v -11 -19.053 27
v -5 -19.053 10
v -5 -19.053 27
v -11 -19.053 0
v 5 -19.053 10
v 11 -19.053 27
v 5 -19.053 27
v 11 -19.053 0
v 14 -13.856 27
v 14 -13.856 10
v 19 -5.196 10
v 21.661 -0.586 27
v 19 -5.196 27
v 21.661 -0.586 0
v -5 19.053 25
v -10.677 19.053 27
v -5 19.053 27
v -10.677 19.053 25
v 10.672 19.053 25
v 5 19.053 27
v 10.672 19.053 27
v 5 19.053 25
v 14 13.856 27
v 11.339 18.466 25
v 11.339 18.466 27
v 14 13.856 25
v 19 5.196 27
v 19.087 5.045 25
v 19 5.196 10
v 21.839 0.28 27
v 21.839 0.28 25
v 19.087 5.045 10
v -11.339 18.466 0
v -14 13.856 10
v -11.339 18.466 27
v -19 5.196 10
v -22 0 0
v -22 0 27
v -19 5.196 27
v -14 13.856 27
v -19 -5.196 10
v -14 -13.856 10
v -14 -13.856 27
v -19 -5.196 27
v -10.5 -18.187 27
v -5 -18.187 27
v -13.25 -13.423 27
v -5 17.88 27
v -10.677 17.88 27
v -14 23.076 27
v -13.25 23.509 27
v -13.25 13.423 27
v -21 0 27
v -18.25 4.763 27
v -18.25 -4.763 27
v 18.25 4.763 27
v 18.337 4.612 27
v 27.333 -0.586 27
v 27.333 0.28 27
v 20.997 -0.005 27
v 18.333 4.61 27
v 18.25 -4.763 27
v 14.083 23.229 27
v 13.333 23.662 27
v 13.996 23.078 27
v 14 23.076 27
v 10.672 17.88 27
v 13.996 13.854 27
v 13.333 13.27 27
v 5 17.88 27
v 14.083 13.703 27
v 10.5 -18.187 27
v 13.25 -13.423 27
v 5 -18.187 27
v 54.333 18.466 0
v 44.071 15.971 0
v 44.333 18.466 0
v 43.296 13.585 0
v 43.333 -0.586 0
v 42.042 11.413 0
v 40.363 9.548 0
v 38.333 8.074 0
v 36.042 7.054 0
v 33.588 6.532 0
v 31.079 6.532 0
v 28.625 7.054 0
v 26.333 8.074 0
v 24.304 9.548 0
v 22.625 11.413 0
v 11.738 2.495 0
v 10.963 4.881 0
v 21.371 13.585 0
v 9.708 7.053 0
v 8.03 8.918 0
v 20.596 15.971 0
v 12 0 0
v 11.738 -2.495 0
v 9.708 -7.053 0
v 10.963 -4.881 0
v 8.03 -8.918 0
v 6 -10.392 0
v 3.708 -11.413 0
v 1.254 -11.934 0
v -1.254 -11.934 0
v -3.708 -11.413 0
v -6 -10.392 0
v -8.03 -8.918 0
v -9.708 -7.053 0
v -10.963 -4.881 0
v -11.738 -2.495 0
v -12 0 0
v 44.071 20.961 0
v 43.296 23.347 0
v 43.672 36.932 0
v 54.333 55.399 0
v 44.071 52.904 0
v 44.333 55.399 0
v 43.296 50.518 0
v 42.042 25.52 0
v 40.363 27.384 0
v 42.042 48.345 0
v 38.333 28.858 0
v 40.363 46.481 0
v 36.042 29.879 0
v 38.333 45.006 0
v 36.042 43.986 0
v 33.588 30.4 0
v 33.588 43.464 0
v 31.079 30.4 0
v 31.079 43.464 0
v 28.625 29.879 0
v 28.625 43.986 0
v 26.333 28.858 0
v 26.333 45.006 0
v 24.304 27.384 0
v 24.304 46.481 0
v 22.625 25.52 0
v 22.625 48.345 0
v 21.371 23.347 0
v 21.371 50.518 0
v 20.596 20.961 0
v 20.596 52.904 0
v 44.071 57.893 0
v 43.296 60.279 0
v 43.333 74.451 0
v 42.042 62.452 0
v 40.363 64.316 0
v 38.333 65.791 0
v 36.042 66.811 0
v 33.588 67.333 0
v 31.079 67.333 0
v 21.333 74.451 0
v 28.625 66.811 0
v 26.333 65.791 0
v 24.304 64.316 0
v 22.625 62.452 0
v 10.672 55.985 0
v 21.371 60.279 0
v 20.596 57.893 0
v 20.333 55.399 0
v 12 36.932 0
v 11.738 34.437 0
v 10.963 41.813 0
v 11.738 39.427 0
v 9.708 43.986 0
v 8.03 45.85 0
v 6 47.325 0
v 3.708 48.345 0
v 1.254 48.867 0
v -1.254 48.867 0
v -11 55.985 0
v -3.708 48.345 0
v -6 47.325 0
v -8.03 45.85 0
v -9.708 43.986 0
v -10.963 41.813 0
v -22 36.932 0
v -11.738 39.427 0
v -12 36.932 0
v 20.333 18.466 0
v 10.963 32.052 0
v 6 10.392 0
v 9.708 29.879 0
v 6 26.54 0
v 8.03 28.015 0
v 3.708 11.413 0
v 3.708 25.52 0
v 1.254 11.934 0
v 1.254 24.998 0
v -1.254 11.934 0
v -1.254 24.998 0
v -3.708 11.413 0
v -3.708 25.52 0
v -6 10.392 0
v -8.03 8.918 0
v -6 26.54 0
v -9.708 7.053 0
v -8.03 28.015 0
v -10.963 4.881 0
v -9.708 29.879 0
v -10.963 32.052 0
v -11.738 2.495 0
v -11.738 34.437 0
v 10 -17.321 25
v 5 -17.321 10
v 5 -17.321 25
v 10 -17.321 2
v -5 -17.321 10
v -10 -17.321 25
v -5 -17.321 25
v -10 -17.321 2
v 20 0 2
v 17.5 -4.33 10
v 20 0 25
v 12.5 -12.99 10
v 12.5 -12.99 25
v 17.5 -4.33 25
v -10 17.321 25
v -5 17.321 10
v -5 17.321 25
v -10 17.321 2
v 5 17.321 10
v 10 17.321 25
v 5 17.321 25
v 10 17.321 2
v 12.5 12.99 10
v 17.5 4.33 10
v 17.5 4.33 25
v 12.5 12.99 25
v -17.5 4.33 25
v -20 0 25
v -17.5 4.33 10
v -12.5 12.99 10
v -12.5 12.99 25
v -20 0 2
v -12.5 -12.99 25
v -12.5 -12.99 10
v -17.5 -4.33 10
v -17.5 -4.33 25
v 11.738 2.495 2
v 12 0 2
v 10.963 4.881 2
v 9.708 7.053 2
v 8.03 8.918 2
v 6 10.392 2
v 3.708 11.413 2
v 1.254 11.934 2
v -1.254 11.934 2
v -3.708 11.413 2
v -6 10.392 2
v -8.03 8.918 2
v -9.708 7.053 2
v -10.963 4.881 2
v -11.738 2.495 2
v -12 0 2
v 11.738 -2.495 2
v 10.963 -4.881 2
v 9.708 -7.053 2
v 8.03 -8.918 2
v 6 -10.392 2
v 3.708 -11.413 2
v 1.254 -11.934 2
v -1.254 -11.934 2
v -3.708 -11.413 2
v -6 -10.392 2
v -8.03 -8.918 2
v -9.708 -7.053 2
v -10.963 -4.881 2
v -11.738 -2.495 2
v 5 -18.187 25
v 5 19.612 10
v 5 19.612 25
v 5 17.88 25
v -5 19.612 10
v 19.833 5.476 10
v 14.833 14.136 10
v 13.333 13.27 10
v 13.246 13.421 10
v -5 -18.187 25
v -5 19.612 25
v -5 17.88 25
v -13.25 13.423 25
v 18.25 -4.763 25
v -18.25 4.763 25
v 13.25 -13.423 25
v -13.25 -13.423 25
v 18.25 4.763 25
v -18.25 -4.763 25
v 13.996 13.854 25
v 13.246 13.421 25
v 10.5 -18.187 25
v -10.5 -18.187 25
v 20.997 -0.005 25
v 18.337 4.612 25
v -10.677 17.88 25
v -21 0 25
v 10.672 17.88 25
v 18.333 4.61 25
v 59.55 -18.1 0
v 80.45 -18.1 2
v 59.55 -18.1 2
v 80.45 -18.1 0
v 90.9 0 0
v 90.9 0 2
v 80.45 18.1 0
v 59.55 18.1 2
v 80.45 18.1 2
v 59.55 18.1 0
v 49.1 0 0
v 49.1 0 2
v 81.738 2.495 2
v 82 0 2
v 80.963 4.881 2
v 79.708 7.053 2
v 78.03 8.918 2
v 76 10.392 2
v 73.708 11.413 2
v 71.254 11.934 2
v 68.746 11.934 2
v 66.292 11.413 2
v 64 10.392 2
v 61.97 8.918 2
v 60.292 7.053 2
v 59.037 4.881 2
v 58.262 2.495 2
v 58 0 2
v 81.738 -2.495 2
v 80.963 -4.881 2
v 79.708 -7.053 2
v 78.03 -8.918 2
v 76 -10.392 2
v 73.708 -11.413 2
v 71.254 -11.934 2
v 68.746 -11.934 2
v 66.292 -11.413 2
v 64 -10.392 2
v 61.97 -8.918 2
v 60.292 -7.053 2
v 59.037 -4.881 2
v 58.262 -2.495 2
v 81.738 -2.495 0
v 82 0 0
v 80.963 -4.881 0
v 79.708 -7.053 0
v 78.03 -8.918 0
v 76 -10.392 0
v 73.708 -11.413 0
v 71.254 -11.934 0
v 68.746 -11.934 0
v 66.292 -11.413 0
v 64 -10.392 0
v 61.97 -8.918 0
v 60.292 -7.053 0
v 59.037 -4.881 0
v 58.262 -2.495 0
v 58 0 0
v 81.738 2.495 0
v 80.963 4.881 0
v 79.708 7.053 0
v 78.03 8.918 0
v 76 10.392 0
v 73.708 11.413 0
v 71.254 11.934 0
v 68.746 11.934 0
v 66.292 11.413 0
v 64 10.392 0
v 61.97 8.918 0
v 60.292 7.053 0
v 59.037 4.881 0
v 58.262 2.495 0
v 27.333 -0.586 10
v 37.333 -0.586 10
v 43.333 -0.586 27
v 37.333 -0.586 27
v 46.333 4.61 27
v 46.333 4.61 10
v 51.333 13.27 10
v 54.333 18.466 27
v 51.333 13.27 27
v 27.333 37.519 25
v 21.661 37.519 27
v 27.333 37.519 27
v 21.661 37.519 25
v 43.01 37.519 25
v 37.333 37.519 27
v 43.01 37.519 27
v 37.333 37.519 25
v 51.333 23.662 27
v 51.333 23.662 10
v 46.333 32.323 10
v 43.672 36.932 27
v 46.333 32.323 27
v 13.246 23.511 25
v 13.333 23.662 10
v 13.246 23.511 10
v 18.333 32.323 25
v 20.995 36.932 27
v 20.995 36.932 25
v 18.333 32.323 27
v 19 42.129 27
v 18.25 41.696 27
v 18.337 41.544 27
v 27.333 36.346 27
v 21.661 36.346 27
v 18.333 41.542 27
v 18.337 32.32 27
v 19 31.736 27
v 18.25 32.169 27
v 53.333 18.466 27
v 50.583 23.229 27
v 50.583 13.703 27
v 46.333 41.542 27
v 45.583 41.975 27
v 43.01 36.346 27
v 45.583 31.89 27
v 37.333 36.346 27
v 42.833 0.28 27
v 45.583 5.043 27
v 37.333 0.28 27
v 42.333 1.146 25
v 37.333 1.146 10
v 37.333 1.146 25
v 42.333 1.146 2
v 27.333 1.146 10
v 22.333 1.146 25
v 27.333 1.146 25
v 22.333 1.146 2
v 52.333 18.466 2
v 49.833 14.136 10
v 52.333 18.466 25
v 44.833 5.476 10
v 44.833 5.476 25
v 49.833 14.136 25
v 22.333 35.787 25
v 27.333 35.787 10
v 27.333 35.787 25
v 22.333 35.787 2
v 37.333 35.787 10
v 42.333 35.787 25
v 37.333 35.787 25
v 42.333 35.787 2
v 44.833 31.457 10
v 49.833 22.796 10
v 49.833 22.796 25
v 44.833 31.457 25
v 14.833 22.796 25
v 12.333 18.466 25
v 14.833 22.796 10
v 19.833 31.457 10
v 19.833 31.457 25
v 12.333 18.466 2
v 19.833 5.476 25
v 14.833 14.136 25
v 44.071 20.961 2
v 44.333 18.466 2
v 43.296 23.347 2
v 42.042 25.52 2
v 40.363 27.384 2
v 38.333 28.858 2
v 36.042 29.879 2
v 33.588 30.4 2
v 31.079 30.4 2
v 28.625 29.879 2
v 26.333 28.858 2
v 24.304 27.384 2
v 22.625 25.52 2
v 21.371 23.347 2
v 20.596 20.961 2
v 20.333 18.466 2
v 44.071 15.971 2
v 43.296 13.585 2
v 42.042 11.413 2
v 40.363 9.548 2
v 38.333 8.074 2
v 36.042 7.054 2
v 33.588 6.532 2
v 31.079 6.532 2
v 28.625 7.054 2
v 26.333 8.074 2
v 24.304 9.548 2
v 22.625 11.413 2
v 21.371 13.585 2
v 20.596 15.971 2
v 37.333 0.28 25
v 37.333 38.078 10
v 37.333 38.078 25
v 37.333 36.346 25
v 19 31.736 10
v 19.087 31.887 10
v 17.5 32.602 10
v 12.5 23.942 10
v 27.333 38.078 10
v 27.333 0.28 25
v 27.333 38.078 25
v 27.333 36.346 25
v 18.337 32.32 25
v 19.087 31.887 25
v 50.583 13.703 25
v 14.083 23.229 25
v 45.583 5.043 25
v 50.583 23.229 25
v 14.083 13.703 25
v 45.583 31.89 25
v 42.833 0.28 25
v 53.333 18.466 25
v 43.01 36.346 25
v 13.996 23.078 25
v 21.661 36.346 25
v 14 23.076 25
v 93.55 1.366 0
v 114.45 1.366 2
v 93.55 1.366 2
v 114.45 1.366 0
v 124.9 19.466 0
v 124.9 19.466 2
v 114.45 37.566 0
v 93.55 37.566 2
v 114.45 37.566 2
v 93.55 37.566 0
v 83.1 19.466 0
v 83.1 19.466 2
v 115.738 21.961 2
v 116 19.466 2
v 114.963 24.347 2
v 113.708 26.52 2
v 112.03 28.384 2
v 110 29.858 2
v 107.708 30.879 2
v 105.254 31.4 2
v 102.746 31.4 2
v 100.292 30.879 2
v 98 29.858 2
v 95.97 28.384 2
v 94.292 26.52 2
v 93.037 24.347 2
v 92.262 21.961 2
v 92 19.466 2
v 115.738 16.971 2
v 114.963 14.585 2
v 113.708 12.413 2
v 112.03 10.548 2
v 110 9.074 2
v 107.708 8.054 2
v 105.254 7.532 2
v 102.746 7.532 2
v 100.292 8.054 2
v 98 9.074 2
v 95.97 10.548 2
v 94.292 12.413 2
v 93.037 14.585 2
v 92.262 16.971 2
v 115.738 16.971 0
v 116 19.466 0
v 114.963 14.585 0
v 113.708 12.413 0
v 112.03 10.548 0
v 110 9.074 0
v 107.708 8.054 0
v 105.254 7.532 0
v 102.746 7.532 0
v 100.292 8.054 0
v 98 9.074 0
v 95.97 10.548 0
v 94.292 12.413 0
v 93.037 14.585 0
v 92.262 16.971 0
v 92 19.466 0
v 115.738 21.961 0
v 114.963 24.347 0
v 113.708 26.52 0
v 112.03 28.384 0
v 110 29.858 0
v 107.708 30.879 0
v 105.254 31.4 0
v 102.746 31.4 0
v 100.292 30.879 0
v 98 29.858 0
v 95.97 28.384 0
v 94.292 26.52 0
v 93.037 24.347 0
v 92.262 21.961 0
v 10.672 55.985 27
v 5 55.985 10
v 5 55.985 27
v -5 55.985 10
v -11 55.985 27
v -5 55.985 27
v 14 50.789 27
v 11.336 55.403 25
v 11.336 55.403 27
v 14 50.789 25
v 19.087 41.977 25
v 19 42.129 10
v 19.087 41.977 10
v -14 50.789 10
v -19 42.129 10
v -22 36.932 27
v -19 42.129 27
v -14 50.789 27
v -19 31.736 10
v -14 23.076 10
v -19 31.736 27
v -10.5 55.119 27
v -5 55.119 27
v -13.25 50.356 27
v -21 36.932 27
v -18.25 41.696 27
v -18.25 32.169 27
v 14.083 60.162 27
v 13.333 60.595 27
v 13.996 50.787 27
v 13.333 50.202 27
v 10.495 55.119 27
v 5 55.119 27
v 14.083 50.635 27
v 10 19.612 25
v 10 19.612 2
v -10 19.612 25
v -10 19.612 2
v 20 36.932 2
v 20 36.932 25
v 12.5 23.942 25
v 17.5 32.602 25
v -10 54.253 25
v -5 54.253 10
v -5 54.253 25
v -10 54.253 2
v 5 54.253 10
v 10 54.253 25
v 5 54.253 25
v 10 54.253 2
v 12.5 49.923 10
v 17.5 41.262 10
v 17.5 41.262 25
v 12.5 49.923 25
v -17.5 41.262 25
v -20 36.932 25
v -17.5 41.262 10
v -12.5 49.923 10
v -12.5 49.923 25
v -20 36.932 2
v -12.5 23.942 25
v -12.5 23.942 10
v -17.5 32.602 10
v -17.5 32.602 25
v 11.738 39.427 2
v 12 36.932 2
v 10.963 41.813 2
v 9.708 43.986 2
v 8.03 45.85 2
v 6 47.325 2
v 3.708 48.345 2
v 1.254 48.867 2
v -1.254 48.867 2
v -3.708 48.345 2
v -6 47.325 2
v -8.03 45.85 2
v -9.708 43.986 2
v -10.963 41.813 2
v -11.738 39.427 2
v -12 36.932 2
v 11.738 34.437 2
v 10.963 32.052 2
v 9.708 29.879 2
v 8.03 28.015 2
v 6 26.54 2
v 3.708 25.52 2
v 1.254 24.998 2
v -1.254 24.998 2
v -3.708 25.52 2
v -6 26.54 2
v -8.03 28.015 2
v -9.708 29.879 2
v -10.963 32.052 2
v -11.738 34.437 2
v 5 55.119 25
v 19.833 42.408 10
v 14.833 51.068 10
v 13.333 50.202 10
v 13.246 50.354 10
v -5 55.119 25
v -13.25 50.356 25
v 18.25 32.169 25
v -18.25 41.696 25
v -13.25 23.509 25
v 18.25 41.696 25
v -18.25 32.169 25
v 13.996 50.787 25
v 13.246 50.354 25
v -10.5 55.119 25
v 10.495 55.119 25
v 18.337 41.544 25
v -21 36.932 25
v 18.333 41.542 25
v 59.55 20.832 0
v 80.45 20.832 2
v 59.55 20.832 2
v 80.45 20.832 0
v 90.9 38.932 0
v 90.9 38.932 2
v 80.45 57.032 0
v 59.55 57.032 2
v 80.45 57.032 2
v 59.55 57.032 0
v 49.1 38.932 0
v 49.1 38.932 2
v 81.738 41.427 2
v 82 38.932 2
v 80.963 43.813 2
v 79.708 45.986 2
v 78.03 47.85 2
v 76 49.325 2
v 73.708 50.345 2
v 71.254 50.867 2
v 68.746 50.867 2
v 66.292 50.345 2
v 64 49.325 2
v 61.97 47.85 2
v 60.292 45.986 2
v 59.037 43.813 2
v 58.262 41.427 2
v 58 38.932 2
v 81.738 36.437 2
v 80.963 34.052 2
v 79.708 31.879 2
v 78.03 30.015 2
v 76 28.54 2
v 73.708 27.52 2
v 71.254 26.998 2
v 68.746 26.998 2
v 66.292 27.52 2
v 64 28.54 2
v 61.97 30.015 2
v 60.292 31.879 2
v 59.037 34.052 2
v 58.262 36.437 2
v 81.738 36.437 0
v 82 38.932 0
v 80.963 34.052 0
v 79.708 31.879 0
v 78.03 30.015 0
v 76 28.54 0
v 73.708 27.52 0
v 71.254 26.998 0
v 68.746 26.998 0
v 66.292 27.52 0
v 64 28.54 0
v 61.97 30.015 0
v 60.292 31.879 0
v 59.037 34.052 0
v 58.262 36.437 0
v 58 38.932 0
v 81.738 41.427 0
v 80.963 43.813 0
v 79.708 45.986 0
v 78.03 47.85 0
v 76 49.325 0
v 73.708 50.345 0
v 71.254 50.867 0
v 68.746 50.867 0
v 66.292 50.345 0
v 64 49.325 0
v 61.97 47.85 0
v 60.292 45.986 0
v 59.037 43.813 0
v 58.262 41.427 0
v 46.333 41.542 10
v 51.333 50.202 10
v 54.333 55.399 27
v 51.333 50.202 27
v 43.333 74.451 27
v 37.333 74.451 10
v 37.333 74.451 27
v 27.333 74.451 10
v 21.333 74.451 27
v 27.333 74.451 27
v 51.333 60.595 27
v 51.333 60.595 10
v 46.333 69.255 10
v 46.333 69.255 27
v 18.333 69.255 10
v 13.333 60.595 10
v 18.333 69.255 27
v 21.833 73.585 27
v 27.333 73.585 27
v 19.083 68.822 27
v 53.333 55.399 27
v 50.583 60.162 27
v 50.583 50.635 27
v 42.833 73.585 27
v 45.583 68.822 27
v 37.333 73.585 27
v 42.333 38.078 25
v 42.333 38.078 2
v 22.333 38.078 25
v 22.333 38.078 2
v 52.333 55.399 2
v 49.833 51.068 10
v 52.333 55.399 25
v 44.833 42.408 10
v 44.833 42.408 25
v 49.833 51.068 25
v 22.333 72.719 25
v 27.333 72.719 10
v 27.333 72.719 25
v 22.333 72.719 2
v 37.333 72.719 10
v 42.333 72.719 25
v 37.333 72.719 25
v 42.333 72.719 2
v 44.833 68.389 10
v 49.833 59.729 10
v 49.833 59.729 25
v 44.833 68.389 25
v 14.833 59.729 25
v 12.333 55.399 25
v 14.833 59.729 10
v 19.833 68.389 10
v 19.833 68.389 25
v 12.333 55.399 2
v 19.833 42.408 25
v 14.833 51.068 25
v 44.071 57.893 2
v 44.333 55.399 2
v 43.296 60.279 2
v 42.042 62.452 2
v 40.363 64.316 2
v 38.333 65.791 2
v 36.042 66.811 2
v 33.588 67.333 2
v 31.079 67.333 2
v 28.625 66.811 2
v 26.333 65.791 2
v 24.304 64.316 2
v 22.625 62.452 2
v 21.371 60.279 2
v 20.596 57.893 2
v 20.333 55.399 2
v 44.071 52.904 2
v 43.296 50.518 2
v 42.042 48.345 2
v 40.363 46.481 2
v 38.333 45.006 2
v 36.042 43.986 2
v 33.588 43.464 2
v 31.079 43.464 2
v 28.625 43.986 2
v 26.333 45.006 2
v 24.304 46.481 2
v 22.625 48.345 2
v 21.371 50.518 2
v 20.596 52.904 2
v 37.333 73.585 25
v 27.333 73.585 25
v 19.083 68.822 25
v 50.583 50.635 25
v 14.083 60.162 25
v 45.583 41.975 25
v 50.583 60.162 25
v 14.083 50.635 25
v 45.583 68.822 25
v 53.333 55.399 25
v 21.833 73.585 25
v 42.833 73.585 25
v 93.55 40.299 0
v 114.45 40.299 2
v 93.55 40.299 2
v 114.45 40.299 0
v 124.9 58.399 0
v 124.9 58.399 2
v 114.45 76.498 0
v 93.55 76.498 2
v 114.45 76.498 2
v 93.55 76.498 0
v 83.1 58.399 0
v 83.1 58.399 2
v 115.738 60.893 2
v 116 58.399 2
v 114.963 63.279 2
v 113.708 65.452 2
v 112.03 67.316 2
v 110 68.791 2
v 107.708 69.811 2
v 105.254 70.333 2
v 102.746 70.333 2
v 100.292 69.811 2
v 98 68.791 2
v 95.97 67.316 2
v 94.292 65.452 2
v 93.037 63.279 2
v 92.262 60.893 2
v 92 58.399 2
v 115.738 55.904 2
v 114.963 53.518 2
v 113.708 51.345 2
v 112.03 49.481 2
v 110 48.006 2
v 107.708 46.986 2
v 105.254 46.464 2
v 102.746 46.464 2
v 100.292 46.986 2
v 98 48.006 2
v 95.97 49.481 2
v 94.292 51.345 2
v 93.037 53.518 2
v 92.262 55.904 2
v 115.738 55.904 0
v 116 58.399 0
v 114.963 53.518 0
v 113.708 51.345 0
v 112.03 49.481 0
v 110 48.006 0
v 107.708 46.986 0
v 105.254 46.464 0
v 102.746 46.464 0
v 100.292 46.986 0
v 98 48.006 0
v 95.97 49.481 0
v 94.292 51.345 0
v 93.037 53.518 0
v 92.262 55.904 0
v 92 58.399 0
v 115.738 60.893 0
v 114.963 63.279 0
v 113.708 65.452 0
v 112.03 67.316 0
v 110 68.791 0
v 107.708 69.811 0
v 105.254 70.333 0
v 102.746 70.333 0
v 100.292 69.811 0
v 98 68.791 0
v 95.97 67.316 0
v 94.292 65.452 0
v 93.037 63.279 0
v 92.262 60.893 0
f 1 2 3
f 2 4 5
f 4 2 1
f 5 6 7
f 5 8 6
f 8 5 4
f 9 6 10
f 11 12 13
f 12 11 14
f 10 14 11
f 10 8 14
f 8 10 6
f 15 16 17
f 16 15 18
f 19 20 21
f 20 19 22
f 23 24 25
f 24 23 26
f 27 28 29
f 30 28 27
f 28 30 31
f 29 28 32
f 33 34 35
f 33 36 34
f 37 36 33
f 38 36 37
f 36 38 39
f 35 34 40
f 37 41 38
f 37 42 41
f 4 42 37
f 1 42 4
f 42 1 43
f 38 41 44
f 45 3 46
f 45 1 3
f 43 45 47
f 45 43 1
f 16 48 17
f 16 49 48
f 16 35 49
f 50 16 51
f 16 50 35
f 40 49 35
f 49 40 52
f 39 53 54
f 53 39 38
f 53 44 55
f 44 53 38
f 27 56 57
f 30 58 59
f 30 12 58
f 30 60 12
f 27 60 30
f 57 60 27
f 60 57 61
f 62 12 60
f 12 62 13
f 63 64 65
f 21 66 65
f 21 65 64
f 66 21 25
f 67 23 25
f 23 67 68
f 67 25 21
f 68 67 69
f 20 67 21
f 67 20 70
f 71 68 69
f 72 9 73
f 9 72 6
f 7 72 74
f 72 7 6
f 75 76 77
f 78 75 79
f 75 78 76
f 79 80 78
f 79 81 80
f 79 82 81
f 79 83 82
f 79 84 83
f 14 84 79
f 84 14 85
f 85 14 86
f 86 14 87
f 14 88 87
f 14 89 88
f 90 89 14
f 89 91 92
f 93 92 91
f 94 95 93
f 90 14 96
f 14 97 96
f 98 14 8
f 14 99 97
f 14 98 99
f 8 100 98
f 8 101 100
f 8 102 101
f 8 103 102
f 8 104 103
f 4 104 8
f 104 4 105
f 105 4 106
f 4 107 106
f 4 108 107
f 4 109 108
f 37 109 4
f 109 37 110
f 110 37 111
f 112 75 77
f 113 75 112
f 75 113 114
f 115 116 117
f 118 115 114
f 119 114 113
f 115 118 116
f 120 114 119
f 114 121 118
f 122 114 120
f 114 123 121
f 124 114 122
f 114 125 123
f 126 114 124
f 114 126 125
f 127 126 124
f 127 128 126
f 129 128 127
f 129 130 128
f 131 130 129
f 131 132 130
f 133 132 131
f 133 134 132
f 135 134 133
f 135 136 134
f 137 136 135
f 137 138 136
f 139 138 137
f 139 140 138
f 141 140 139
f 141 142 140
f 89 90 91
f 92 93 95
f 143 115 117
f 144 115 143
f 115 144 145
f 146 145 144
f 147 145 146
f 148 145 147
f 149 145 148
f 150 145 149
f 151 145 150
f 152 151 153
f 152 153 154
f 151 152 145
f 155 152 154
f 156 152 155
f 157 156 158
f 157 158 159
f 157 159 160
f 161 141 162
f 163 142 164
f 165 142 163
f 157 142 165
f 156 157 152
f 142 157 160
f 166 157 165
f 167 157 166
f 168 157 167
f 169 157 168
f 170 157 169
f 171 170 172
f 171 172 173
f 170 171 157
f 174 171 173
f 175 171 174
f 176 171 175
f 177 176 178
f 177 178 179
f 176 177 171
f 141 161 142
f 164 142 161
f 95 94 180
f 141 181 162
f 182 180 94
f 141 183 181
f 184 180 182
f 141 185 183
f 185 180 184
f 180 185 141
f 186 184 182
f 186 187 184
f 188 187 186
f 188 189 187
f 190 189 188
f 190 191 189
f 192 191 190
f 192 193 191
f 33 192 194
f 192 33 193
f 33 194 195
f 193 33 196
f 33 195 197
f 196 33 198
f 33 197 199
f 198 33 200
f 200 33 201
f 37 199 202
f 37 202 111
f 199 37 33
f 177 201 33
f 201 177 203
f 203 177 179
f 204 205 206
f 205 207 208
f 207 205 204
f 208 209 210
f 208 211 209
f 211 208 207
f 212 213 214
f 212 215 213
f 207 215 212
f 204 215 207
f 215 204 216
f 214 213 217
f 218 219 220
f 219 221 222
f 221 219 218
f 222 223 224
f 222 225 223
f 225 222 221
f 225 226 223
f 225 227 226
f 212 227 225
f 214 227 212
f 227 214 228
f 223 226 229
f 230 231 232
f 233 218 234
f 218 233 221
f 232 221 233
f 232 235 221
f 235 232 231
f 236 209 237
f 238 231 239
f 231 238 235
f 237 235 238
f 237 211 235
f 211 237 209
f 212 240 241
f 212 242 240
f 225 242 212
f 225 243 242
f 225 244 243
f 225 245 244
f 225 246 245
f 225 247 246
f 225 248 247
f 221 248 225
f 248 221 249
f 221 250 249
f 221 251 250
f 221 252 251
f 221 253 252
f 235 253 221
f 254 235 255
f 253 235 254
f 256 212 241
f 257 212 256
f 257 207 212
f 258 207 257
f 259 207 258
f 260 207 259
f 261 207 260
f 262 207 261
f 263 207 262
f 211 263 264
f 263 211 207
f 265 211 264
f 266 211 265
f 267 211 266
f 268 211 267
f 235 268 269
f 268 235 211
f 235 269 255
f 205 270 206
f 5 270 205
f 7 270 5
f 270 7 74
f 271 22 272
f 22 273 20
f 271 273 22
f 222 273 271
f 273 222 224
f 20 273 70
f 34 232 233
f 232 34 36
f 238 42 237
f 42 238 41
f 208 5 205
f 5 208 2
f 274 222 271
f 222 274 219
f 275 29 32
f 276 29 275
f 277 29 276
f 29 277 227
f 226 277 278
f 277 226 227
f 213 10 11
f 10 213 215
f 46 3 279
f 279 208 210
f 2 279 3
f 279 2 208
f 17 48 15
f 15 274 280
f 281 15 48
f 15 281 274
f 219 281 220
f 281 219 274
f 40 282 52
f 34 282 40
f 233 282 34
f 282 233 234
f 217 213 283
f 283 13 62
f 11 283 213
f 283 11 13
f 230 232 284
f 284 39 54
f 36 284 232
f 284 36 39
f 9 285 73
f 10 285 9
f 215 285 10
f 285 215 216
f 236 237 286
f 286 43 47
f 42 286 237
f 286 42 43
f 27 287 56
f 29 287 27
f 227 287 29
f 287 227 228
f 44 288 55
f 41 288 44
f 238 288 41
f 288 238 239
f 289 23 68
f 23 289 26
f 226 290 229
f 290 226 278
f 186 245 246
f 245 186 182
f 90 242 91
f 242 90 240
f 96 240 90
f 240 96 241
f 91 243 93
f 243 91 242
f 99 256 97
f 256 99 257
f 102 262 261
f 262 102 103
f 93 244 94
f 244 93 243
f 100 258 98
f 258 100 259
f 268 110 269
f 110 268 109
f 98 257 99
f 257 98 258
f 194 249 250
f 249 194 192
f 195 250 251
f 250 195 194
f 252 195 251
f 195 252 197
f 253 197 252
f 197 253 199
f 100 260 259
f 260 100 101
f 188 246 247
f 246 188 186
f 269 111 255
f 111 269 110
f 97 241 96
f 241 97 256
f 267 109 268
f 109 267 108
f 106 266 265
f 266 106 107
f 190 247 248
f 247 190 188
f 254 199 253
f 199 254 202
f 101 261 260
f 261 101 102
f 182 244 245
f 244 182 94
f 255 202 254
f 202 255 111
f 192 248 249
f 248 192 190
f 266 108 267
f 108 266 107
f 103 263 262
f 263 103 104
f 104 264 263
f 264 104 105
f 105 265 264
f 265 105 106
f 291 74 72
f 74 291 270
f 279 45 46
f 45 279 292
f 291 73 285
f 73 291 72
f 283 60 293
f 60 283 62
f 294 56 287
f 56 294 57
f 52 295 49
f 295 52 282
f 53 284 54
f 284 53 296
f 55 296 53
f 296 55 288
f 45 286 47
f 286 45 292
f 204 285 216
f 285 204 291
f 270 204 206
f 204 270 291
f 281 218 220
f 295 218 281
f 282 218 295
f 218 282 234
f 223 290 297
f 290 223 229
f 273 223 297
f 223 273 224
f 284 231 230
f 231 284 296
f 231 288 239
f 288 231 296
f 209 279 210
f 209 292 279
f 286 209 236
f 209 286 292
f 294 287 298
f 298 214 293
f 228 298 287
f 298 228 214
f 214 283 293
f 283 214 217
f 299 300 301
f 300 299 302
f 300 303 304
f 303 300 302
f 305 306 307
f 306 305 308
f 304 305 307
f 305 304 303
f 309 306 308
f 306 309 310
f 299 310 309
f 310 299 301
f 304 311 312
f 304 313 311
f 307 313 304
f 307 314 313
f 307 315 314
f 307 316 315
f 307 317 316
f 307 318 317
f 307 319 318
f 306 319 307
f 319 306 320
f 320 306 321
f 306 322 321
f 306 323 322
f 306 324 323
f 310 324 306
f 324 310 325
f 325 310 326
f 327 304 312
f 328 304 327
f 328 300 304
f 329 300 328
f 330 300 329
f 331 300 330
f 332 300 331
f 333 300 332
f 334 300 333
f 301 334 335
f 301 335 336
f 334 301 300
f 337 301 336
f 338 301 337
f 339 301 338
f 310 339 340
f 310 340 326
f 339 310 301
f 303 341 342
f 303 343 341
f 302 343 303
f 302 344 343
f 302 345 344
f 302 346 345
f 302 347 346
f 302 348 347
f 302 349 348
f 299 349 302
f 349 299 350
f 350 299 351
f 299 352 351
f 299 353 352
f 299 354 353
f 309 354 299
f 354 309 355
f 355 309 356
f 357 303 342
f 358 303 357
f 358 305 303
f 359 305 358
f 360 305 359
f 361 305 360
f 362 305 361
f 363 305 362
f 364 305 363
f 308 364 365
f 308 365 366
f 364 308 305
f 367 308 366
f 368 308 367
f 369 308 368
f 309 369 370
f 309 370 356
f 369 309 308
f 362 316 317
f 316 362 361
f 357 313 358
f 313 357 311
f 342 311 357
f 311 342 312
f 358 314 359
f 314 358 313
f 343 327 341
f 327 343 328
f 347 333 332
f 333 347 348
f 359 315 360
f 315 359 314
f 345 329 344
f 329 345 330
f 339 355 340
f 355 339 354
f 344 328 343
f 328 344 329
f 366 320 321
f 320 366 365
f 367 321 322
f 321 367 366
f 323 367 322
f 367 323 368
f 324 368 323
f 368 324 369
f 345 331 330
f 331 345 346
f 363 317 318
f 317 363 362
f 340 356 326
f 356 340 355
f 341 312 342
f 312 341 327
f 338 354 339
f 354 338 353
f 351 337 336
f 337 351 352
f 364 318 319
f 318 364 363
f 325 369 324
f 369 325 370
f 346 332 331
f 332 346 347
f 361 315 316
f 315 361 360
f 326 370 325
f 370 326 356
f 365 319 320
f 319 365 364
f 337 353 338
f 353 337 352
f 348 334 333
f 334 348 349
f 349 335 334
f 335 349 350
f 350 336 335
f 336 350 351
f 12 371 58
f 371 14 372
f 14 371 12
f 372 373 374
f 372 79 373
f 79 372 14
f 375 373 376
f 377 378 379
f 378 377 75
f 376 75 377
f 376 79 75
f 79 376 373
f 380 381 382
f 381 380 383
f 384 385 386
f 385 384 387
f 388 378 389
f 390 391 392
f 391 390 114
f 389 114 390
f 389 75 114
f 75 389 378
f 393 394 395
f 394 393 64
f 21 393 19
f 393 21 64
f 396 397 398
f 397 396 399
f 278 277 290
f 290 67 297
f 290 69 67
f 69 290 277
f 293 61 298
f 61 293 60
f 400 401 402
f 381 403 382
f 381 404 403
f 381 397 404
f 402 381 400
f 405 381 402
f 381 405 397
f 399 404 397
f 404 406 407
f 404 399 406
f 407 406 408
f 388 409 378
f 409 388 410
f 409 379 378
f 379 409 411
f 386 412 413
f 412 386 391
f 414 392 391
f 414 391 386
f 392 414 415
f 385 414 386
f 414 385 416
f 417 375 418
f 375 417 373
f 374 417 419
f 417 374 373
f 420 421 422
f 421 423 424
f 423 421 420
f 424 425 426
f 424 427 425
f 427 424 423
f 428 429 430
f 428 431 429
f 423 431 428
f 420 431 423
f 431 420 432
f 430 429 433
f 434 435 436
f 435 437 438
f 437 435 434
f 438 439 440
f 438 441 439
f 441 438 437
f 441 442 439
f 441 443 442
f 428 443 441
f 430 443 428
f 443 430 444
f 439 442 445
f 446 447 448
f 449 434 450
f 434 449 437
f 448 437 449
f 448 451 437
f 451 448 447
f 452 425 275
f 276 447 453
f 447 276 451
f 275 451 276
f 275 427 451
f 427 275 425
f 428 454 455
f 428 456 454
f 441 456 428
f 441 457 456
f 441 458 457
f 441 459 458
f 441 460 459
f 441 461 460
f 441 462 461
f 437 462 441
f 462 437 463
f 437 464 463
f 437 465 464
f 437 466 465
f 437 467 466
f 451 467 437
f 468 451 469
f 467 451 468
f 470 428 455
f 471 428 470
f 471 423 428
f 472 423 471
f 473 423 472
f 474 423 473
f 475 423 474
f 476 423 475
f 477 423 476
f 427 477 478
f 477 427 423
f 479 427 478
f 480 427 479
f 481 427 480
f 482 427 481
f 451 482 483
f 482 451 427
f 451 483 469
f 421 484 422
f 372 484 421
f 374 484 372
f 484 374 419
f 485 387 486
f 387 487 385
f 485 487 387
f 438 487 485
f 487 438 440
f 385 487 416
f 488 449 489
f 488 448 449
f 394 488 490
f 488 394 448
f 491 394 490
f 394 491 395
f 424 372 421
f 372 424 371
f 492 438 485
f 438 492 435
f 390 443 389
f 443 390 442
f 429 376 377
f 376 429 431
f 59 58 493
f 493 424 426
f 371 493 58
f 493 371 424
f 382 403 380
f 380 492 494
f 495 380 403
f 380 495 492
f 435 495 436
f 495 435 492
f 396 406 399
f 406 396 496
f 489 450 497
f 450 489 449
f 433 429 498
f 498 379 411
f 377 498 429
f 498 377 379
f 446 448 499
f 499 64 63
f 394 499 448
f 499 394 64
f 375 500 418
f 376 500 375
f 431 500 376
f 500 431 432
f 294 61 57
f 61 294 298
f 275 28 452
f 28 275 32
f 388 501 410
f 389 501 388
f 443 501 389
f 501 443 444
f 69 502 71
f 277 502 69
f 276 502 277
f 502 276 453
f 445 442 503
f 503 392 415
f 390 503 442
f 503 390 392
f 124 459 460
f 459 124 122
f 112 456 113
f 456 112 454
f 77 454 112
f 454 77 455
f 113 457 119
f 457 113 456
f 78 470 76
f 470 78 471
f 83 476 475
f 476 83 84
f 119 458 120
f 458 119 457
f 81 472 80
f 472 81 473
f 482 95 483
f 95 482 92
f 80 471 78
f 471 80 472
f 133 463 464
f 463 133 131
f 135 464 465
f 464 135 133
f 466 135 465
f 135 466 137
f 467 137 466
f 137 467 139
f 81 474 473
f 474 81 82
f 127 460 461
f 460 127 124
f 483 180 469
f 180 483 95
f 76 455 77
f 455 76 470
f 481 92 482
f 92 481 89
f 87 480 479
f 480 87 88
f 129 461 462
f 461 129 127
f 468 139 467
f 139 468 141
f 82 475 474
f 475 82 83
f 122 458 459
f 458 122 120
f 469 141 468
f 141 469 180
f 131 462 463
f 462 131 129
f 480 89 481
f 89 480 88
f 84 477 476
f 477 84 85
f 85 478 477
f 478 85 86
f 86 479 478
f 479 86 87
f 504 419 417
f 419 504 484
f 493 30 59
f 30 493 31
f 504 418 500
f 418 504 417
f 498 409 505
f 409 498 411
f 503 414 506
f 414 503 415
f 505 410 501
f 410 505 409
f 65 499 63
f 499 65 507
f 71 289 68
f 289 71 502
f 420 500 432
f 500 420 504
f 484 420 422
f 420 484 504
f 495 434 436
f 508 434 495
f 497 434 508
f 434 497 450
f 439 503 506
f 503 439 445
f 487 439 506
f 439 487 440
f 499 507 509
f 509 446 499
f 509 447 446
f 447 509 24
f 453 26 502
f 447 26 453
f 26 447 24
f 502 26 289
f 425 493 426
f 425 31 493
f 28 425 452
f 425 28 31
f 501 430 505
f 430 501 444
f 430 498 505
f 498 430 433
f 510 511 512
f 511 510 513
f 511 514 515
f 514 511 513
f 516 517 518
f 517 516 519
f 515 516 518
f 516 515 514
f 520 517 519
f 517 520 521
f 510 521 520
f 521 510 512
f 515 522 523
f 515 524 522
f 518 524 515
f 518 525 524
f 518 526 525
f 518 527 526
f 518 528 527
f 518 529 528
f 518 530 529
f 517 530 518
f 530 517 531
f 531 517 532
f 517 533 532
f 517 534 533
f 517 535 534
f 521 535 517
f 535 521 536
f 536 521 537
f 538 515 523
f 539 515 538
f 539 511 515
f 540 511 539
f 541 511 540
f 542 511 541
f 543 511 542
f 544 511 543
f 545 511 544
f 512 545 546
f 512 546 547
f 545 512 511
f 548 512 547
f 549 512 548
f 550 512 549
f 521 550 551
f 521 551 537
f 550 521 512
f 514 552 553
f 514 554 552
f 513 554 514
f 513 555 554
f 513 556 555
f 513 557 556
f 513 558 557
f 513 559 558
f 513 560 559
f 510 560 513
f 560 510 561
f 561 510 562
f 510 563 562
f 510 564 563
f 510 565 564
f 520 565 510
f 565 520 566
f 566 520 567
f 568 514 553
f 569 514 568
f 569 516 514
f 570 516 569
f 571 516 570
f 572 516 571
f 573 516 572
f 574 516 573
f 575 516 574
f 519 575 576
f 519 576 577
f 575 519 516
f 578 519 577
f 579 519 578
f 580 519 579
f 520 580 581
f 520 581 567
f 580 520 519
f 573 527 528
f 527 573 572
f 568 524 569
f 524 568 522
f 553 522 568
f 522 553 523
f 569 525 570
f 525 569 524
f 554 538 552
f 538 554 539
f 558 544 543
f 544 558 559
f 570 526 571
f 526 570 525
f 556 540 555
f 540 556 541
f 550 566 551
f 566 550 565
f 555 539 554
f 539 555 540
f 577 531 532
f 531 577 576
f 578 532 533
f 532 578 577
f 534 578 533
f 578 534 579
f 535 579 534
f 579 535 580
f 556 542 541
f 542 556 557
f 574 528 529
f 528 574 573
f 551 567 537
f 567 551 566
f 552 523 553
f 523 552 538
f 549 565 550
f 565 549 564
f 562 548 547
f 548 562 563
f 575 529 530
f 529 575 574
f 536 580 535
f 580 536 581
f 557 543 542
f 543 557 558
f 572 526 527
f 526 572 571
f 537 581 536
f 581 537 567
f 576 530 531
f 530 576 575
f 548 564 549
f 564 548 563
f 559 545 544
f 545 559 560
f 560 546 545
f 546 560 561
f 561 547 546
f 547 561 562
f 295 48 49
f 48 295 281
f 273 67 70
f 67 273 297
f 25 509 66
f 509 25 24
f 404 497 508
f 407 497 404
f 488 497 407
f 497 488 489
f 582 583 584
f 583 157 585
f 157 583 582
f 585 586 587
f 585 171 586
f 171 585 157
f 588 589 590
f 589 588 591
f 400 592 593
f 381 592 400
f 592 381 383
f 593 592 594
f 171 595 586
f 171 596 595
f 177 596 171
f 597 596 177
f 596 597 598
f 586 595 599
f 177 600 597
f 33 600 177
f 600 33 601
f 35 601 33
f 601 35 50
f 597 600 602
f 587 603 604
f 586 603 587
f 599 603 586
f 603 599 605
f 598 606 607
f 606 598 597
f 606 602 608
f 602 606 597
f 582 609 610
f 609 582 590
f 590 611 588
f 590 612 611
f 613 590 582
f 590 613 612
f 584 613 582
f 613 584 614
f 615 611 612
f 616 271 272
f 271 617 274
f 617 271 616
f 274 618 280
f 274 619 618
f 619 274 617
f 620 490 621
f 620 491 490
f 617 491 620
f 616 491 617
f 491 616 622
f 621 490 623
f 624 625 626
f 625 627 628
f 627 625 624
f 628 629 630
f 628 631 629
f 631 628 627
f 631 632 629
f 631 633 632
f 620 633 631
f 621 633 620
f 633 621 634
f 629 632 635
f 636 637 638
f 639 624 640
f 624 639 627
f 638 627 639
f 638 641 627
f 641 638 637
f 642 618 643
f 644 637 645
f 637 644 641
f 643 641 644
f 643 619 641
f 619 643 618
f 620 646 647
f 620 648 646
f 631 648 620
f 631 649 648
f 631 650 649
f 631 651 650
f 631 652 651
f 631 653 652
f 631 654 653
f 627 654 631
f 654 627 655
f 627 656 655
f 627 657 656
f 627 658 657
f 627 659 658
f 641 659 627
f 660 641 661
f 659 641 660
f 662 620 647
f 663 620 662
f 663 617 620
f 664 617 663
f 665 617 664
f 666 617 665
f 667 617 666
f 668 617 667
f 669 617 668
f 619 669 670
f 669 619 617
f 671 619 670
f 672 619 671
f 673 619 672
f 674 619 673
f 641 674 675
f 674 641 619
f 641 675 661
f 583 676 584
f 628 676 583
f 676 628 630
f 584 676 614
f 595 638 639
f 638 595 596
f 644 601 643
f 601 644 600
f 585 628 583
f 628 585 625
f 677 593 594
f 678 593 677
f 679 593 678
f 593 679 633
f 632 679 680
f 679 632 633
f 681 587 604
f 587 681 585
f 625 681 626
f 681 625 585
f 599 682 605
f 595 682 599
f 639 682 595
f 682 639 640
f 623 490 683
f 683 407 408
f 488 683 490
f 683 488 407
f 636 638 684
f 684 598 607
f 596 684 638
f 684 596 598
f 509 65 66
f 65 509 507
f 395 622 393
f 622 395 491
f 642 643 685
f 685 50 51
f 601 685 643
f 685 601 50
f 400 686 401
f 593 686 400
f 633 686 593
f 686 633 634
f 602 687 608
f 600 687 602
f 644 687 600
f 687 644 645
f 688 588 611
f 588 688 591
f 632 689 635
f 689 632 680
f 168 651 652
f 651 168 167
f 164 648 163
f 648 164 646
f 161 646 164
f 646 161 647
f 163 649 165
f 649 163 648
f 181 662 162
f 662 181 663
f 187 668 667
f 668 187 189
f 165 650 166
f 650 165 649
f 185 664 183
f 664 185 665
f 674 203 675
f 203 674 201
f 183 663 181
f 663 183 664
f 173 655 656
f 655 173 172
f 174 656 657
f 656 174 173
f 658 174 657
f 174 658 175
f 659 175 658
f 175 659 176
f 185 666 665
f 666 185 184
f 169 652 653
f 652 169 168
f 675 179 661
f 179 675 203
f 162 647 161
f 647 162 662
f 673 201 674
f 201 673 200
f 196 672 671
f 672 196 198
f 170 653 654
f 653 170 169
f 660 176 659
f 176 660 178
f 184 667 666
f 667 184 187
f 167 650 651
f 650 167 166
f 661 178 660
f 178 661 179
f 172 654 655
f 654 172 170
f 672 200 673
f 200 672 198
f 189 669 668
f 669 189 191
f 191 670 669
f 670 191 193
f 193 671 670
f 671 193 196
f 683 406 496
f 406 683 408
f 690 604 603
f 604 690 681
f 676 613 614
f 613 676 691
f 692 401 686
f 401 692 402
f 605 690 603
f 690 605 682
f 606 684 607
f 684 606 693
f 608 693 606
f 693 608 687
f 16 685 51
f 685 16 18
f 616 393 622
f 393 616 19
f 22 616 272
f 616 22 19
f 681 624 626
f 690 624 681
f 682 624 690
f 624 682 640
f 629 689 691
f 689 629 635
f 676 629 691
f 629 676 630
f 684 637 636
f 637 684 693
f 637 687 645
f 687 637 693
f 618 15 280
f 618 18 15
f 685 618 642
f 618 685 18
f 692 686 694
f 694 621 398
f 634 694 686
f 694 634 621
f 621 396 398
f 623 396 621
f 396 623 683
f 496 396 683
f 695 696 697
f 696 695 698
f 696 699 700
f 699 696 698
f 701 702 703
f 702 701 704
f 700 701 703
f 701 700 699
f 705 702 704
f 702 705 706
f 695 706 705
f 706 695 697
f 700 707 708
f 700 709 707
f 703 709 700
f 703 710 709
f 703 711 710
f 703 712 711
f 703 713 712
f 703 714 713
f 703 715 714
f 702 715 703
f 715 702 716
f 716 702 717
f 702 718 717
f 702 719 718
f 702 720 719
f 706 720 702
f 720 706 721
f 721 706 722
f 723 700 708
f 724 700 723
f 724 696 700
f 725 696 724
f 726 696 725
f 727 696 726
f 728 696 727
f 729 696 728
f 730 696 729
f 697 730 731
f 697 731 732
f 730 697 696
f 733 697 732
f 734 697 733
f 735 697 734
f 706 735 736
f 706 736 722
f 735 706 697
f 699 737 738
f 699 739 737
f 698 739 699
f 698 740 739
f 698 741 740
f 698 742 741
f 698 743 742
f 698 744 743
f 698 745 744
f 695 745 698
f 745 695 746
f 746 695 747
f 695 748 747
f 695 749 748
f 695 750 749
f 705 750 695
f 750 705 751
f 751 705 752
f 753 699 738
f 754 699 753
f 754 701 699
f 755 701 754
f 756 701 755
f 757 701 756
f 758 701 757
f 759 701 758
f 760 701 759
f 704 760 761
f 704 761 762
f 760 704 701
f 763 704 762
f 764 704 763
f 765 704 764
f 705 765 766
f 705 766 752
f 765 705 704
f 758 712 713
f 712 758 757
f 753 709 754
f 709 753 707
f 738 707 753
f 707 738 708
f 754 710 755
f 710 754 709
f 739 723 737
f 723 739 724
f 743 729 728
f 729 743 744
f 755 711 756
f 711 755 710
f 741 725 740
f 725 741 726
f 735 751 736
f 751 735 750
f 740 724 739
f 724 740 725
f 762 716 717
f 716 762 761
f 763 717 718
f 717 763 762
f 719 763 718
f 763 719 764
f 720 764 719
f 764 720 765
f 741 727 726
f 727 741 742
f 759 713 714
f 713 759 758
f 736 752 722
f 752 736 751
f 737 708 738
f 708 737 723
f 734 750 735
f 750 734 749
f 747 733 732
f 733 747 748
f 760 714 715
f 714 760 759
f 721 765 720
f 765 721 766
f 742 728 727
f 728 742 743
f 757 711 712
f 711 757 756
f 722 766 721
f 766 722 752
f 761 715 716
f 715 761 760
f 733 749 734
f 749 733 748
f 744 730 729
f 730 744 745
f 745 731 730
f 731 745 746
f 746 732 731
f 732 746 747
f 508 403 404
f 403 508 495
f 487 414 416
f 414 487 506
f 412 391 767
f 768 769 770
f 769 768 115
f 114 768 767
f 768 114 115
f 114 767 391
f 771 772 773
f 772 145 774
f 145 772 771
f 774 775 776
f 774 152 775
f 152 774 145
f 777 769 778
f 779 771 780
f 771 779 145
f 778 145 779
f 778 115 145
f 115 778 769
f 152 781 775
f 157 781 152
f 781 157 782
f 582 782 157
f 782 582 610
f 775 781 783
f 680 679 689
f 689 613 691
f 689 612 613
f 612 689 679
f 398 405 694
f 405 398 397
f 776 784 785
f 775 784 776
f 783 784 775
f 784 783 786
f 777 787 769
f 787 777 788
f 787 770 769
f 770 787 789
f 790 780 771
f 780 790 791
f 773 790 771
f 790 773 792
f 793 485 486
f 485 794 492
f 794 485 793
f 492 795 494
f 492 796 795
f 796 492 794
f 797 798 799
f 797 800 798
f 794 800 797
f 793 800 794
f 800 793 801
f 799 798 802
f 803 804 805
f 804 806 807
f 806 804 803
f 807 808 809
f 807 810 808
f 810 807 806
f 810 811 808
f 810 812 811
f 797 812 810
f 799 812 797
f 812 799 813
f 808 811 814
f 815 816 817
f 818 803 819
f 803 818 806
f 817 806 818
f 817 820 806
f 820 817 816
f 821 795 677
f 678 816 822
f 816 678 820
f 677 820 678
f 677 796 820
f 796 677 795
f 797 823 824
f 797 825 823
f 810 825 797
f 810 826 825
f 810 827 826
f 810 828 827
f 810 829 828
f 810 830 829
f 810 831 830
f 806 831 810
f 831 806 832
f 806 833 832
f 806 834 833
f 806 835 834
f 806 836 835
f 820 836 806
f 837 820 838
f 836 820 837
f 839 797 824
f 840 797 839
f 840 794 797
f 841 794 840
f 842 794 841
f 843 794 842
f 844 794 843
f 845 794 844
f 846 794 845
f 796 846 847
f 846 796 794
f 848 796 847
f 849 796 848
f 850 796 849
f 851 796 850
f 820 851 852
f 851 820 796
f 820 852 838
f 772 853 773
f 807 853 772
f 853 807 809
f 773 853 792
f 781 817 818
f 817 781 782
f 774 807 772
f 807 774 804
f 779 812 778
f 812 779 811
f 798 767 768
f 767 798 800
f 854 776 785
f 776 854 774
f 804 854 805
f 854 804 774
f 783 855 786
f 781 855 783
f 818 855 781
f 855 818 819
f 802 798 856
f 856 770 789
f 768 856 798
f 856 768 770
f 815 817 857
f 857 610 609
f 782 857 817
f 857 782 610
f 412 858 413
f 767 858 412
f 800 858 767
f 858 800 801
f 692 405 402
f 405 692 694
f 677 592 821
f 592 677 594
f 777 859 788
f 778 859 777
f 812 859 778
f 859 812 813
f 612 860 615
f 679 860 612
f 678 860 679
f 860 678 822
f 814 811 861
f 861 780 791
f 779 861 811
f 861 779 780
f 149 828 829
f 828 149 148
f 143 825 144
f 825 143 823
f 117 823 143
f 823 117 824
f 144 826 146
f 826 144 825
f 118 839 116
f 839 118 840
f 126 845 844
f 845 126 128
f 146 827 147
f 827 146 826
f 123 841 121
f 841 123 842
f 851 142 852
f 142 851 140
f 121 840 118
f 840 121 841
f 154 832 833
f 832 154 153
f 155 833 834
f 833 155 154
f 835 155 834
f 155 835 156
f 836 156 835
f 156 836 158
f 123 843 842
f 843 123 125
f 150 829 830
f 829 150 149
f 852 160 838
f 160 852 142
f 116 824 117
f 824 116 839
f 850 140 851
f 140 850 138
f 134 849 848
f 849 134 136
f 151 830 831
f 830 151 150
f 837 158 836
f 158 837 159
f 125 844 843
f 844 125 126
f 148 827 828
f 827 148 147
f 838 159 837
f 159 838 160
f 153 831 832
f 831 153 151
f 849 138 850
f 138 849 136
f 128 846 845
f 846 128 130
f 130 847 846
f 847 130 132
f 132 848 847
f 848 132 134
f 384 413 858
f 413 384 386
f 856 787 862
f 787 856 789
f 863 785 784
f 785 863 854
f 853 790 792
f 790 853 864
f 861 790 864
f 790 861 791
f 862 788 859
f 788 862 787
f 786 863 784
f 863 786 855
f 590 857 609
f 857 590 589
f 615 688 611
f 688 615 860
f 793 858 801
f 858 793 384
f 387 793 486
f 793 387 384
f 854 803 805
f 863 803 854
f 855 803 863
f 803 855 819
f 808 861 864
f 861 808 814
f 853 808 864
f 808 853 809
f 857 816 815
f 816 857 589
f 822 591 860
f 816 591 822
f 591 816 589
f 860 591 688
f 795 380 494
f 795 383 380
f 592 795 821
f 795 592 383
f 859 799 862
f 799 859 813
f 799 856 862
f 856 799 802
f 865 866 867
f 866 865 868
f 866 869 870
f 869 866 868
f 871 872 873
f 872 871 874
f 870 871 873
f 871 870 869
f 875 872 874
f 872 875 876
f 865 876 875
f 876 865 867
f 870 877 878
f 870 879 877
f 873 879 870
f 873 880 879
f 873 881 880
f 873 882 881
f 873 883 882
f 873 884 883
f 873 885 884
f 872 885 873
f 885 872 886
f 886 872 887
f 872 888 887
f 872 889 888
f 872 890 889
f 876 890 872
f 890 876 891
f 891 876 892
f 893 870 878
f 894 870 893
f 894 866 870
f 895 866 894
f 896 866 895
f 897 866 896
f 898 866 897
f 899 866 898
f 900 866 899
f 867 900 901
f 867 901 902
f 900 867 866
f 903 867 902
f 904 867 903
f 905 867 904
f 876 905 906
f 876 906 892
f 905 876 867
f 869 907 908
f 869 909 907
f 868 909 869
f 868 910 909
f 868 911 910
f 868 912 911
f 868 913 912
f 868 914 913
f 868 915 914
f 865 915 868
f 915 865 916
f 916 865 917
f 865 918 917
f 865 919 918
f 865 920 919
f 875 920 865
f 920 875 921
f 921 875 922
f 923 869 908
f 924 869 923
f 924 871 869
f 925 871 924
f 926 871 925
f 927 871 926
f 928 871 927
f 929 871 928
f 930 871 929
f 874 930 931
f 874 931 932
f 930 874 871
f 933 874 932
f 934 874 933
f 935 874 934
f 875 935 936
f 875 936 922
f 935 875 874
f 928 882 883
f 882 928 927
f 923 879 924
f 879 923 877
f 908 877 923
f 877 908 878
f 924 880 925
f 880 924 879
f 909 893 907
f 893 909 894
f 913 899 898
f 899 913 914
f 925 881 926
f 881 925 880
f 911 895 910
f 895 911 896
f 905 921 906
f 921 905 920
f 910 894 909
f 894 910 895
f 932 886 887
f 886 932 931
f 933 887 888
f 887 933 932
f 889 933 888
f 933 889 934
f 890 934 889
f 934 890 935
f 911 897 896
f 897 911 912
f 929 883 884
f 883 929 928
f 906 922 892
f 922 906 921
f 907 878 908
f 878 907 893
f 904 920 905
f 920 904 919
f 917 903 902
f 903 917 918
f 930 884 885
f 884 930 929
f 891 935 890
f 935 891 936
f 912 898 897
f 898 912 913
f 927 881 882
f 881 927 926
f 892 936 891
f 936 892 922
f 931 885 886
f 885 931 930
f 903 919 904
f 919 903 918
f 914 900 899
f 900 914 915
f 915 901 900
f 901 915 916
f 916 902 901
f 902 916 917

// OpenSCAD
//================================================
// Hexagonal Tile holder for Boardgames by satanin
//================================================
// All sizes are mm.
// Hexagonal Tile Diameter
diameter=40;
// Container Height
height=27; 
// Wall and base thickness
wall=2;//[1:5]
// use cover?
use_cover="yes"; //["yes":yes,"no":no]
// Reforced structure
use_reforced_structure="yes";//["yes":yes,"no":no]
// use perforations in cover?
use_cover_perforation="yes";//["yes":yes,"no":no]
// Perforation perforation percentage
cover_perforation_percentage=60;//[1:90]
// use perforations in base?
use_base_perforation="yes";//["yes":yes,"no":no]
// Base perforation percentage
base_perforation_percentage=60;//[1:90]
// use minimalistic structure
minimalistic="no";//["yes":yes,"no":no]
// print just the cover?
just_the_cover="no";//["yes":yes,"no":no]
// Multiple pieces
use_multiple_pieces="yes";//["yes":yes,"no":no]
// How many pieces?
pieces=4;//[1:10]
// use hive distribution
use_hive_distribution="yes";//["yes":yes,"no":no]

//===============================================
/* [Hidden] */
sides=6;
spacer=1;
radius=diameter/2;

use_text="no";
cover_text="Tiles";
text_size=5;

cover_position_spacer=diameter/2;

$reforced_structure_z= use_reforced_structure=="yes" ? diameter/5 : wall;
module perforation(perforation_percentage){
	perforation_radius = (radius*perforation_percentage)/100;
	cylinder(height,perforation_radius, perforation_radius, center=true);
}

module gap (){
	factor=2;
	slot=radius/2;
	rotate([0,0,0], center=true){
		translate([-(slot)/2,- diameter*(factor/2),wall+$reforced_structure_z]){
			cube([slot,diameter*factor,height*factor]);
		}
	}
	
	rotate([0,0,60], center=true){
		translate([-(slot)/2,- diameter*(factor/2),wall+$reforced_structure_z]){
			cube([slot,diameter*factor,height*factor]);
		}
	}
	rotate([0,0,120], center=true){
		translate([-(slot)/2,- diameter*(factor/2),wall+$reforced_structure_z]){
			cube([slot,diameter*factor,height*factor]);
		}
	}
	
	if(minimalistic=="yes"){
		rotate([0,0,30], center=true){
			translate([-(slot),- diameter*(factor/2),wall+$reforced_structure_z]){
				cube([radius,diameter*factor,height*factor]);
			}
		}
	}
}

module holder() {
	z=wall;
	difference(){
		difference(){
			cylinder(height,radius+wall,radius+wall,center=false,$fn=sides);
			translate([0,0,z]){
				cylinder(height+100,radius,radius,center=false,$fn=sides);
			}
		}
		gap();
		if(use_base_perforation=="yes"){
			perforation(base_perforation_percentage);
		}
	}
}

module cover(){
	translate([diameter+cover_position_spacer,0,0]){
		if(use_cover=="yes"){
			spacer=0.1;
			color("red"){
				difference(){
					cylinder(wall,(radius+wall-spacer)-(wall/2),(radius+wall-spacer)-(wall/2),center=false,$fn=sides);
					if(use_cover_perforation=="yes"){
						perforation(cover_perforation_percentage);
					}
				}
			}
			if(use_text=="yes"){
				color("blue"){
					translate([diameter+position_spacer, radius/1.5, wall]){
						linear_extrude(0.5){
							text(cover_text, text_size, valign="center", halign="center");
						}
					}
				}
			}
		}
	}
}

module cover_(){
	spacer=0.5;
	color("red"){
		translate([0,0,height-wall]){
			difference(){
				cylinder(wall+10,(radius+wall)-(wall/2),(radius+wall)-(wall/2),center=false,$fn=sides);
				if (use_cover_perforation=="yes"){
					translate([0,0,height-wall]){
						cylinder(height,radius/2, radius/2, center=true);
					}
				}
			}
		}	
	}
}

module final_holder(){
	if(just_the_cover!="yes"){
		if (use_cover=="yes") {
			difference(){
				holder();
				cover_();
			}
		}else{
			holder();
		}
	}
}

if (use_multiple_pieces=="yes"){
	for(i=[0:1:pieces-1]){
		side=diameter+wall;
		move_odd=sqrt((side*side)-(radius*radius));
		if(use_hive_distribution=="yes"){
			if(i%2>0){
				translate([(diameter-(radius/3.0)- wall/2),(move_odd/2)*i,0]){
					final_holder();
				}
				translate([(diameter*2)-radius*1.8,move_odd*(i/2)+i,0]){
					cover();
				}
			}else{
				translate([0,move_odd*(i/2),0]){
					final_holder();
				}
				translate([diameter-radius*1.5,move_odd*(i/2)+i,0]){
					cover();
				}
			}
		}else{
			translate([0,move_odd*(i),0]){
				final_holder();
			}
			translate([0,move_odd*(i),0]){
				cover();
			}
		}
	}
}else{
	if (just_the_cover=="yes"){
		translate([-diameter-cover_position_spacer,0,0]){
			cover();
		}
	}else{
		final_holder();
		cover();
	}
}
